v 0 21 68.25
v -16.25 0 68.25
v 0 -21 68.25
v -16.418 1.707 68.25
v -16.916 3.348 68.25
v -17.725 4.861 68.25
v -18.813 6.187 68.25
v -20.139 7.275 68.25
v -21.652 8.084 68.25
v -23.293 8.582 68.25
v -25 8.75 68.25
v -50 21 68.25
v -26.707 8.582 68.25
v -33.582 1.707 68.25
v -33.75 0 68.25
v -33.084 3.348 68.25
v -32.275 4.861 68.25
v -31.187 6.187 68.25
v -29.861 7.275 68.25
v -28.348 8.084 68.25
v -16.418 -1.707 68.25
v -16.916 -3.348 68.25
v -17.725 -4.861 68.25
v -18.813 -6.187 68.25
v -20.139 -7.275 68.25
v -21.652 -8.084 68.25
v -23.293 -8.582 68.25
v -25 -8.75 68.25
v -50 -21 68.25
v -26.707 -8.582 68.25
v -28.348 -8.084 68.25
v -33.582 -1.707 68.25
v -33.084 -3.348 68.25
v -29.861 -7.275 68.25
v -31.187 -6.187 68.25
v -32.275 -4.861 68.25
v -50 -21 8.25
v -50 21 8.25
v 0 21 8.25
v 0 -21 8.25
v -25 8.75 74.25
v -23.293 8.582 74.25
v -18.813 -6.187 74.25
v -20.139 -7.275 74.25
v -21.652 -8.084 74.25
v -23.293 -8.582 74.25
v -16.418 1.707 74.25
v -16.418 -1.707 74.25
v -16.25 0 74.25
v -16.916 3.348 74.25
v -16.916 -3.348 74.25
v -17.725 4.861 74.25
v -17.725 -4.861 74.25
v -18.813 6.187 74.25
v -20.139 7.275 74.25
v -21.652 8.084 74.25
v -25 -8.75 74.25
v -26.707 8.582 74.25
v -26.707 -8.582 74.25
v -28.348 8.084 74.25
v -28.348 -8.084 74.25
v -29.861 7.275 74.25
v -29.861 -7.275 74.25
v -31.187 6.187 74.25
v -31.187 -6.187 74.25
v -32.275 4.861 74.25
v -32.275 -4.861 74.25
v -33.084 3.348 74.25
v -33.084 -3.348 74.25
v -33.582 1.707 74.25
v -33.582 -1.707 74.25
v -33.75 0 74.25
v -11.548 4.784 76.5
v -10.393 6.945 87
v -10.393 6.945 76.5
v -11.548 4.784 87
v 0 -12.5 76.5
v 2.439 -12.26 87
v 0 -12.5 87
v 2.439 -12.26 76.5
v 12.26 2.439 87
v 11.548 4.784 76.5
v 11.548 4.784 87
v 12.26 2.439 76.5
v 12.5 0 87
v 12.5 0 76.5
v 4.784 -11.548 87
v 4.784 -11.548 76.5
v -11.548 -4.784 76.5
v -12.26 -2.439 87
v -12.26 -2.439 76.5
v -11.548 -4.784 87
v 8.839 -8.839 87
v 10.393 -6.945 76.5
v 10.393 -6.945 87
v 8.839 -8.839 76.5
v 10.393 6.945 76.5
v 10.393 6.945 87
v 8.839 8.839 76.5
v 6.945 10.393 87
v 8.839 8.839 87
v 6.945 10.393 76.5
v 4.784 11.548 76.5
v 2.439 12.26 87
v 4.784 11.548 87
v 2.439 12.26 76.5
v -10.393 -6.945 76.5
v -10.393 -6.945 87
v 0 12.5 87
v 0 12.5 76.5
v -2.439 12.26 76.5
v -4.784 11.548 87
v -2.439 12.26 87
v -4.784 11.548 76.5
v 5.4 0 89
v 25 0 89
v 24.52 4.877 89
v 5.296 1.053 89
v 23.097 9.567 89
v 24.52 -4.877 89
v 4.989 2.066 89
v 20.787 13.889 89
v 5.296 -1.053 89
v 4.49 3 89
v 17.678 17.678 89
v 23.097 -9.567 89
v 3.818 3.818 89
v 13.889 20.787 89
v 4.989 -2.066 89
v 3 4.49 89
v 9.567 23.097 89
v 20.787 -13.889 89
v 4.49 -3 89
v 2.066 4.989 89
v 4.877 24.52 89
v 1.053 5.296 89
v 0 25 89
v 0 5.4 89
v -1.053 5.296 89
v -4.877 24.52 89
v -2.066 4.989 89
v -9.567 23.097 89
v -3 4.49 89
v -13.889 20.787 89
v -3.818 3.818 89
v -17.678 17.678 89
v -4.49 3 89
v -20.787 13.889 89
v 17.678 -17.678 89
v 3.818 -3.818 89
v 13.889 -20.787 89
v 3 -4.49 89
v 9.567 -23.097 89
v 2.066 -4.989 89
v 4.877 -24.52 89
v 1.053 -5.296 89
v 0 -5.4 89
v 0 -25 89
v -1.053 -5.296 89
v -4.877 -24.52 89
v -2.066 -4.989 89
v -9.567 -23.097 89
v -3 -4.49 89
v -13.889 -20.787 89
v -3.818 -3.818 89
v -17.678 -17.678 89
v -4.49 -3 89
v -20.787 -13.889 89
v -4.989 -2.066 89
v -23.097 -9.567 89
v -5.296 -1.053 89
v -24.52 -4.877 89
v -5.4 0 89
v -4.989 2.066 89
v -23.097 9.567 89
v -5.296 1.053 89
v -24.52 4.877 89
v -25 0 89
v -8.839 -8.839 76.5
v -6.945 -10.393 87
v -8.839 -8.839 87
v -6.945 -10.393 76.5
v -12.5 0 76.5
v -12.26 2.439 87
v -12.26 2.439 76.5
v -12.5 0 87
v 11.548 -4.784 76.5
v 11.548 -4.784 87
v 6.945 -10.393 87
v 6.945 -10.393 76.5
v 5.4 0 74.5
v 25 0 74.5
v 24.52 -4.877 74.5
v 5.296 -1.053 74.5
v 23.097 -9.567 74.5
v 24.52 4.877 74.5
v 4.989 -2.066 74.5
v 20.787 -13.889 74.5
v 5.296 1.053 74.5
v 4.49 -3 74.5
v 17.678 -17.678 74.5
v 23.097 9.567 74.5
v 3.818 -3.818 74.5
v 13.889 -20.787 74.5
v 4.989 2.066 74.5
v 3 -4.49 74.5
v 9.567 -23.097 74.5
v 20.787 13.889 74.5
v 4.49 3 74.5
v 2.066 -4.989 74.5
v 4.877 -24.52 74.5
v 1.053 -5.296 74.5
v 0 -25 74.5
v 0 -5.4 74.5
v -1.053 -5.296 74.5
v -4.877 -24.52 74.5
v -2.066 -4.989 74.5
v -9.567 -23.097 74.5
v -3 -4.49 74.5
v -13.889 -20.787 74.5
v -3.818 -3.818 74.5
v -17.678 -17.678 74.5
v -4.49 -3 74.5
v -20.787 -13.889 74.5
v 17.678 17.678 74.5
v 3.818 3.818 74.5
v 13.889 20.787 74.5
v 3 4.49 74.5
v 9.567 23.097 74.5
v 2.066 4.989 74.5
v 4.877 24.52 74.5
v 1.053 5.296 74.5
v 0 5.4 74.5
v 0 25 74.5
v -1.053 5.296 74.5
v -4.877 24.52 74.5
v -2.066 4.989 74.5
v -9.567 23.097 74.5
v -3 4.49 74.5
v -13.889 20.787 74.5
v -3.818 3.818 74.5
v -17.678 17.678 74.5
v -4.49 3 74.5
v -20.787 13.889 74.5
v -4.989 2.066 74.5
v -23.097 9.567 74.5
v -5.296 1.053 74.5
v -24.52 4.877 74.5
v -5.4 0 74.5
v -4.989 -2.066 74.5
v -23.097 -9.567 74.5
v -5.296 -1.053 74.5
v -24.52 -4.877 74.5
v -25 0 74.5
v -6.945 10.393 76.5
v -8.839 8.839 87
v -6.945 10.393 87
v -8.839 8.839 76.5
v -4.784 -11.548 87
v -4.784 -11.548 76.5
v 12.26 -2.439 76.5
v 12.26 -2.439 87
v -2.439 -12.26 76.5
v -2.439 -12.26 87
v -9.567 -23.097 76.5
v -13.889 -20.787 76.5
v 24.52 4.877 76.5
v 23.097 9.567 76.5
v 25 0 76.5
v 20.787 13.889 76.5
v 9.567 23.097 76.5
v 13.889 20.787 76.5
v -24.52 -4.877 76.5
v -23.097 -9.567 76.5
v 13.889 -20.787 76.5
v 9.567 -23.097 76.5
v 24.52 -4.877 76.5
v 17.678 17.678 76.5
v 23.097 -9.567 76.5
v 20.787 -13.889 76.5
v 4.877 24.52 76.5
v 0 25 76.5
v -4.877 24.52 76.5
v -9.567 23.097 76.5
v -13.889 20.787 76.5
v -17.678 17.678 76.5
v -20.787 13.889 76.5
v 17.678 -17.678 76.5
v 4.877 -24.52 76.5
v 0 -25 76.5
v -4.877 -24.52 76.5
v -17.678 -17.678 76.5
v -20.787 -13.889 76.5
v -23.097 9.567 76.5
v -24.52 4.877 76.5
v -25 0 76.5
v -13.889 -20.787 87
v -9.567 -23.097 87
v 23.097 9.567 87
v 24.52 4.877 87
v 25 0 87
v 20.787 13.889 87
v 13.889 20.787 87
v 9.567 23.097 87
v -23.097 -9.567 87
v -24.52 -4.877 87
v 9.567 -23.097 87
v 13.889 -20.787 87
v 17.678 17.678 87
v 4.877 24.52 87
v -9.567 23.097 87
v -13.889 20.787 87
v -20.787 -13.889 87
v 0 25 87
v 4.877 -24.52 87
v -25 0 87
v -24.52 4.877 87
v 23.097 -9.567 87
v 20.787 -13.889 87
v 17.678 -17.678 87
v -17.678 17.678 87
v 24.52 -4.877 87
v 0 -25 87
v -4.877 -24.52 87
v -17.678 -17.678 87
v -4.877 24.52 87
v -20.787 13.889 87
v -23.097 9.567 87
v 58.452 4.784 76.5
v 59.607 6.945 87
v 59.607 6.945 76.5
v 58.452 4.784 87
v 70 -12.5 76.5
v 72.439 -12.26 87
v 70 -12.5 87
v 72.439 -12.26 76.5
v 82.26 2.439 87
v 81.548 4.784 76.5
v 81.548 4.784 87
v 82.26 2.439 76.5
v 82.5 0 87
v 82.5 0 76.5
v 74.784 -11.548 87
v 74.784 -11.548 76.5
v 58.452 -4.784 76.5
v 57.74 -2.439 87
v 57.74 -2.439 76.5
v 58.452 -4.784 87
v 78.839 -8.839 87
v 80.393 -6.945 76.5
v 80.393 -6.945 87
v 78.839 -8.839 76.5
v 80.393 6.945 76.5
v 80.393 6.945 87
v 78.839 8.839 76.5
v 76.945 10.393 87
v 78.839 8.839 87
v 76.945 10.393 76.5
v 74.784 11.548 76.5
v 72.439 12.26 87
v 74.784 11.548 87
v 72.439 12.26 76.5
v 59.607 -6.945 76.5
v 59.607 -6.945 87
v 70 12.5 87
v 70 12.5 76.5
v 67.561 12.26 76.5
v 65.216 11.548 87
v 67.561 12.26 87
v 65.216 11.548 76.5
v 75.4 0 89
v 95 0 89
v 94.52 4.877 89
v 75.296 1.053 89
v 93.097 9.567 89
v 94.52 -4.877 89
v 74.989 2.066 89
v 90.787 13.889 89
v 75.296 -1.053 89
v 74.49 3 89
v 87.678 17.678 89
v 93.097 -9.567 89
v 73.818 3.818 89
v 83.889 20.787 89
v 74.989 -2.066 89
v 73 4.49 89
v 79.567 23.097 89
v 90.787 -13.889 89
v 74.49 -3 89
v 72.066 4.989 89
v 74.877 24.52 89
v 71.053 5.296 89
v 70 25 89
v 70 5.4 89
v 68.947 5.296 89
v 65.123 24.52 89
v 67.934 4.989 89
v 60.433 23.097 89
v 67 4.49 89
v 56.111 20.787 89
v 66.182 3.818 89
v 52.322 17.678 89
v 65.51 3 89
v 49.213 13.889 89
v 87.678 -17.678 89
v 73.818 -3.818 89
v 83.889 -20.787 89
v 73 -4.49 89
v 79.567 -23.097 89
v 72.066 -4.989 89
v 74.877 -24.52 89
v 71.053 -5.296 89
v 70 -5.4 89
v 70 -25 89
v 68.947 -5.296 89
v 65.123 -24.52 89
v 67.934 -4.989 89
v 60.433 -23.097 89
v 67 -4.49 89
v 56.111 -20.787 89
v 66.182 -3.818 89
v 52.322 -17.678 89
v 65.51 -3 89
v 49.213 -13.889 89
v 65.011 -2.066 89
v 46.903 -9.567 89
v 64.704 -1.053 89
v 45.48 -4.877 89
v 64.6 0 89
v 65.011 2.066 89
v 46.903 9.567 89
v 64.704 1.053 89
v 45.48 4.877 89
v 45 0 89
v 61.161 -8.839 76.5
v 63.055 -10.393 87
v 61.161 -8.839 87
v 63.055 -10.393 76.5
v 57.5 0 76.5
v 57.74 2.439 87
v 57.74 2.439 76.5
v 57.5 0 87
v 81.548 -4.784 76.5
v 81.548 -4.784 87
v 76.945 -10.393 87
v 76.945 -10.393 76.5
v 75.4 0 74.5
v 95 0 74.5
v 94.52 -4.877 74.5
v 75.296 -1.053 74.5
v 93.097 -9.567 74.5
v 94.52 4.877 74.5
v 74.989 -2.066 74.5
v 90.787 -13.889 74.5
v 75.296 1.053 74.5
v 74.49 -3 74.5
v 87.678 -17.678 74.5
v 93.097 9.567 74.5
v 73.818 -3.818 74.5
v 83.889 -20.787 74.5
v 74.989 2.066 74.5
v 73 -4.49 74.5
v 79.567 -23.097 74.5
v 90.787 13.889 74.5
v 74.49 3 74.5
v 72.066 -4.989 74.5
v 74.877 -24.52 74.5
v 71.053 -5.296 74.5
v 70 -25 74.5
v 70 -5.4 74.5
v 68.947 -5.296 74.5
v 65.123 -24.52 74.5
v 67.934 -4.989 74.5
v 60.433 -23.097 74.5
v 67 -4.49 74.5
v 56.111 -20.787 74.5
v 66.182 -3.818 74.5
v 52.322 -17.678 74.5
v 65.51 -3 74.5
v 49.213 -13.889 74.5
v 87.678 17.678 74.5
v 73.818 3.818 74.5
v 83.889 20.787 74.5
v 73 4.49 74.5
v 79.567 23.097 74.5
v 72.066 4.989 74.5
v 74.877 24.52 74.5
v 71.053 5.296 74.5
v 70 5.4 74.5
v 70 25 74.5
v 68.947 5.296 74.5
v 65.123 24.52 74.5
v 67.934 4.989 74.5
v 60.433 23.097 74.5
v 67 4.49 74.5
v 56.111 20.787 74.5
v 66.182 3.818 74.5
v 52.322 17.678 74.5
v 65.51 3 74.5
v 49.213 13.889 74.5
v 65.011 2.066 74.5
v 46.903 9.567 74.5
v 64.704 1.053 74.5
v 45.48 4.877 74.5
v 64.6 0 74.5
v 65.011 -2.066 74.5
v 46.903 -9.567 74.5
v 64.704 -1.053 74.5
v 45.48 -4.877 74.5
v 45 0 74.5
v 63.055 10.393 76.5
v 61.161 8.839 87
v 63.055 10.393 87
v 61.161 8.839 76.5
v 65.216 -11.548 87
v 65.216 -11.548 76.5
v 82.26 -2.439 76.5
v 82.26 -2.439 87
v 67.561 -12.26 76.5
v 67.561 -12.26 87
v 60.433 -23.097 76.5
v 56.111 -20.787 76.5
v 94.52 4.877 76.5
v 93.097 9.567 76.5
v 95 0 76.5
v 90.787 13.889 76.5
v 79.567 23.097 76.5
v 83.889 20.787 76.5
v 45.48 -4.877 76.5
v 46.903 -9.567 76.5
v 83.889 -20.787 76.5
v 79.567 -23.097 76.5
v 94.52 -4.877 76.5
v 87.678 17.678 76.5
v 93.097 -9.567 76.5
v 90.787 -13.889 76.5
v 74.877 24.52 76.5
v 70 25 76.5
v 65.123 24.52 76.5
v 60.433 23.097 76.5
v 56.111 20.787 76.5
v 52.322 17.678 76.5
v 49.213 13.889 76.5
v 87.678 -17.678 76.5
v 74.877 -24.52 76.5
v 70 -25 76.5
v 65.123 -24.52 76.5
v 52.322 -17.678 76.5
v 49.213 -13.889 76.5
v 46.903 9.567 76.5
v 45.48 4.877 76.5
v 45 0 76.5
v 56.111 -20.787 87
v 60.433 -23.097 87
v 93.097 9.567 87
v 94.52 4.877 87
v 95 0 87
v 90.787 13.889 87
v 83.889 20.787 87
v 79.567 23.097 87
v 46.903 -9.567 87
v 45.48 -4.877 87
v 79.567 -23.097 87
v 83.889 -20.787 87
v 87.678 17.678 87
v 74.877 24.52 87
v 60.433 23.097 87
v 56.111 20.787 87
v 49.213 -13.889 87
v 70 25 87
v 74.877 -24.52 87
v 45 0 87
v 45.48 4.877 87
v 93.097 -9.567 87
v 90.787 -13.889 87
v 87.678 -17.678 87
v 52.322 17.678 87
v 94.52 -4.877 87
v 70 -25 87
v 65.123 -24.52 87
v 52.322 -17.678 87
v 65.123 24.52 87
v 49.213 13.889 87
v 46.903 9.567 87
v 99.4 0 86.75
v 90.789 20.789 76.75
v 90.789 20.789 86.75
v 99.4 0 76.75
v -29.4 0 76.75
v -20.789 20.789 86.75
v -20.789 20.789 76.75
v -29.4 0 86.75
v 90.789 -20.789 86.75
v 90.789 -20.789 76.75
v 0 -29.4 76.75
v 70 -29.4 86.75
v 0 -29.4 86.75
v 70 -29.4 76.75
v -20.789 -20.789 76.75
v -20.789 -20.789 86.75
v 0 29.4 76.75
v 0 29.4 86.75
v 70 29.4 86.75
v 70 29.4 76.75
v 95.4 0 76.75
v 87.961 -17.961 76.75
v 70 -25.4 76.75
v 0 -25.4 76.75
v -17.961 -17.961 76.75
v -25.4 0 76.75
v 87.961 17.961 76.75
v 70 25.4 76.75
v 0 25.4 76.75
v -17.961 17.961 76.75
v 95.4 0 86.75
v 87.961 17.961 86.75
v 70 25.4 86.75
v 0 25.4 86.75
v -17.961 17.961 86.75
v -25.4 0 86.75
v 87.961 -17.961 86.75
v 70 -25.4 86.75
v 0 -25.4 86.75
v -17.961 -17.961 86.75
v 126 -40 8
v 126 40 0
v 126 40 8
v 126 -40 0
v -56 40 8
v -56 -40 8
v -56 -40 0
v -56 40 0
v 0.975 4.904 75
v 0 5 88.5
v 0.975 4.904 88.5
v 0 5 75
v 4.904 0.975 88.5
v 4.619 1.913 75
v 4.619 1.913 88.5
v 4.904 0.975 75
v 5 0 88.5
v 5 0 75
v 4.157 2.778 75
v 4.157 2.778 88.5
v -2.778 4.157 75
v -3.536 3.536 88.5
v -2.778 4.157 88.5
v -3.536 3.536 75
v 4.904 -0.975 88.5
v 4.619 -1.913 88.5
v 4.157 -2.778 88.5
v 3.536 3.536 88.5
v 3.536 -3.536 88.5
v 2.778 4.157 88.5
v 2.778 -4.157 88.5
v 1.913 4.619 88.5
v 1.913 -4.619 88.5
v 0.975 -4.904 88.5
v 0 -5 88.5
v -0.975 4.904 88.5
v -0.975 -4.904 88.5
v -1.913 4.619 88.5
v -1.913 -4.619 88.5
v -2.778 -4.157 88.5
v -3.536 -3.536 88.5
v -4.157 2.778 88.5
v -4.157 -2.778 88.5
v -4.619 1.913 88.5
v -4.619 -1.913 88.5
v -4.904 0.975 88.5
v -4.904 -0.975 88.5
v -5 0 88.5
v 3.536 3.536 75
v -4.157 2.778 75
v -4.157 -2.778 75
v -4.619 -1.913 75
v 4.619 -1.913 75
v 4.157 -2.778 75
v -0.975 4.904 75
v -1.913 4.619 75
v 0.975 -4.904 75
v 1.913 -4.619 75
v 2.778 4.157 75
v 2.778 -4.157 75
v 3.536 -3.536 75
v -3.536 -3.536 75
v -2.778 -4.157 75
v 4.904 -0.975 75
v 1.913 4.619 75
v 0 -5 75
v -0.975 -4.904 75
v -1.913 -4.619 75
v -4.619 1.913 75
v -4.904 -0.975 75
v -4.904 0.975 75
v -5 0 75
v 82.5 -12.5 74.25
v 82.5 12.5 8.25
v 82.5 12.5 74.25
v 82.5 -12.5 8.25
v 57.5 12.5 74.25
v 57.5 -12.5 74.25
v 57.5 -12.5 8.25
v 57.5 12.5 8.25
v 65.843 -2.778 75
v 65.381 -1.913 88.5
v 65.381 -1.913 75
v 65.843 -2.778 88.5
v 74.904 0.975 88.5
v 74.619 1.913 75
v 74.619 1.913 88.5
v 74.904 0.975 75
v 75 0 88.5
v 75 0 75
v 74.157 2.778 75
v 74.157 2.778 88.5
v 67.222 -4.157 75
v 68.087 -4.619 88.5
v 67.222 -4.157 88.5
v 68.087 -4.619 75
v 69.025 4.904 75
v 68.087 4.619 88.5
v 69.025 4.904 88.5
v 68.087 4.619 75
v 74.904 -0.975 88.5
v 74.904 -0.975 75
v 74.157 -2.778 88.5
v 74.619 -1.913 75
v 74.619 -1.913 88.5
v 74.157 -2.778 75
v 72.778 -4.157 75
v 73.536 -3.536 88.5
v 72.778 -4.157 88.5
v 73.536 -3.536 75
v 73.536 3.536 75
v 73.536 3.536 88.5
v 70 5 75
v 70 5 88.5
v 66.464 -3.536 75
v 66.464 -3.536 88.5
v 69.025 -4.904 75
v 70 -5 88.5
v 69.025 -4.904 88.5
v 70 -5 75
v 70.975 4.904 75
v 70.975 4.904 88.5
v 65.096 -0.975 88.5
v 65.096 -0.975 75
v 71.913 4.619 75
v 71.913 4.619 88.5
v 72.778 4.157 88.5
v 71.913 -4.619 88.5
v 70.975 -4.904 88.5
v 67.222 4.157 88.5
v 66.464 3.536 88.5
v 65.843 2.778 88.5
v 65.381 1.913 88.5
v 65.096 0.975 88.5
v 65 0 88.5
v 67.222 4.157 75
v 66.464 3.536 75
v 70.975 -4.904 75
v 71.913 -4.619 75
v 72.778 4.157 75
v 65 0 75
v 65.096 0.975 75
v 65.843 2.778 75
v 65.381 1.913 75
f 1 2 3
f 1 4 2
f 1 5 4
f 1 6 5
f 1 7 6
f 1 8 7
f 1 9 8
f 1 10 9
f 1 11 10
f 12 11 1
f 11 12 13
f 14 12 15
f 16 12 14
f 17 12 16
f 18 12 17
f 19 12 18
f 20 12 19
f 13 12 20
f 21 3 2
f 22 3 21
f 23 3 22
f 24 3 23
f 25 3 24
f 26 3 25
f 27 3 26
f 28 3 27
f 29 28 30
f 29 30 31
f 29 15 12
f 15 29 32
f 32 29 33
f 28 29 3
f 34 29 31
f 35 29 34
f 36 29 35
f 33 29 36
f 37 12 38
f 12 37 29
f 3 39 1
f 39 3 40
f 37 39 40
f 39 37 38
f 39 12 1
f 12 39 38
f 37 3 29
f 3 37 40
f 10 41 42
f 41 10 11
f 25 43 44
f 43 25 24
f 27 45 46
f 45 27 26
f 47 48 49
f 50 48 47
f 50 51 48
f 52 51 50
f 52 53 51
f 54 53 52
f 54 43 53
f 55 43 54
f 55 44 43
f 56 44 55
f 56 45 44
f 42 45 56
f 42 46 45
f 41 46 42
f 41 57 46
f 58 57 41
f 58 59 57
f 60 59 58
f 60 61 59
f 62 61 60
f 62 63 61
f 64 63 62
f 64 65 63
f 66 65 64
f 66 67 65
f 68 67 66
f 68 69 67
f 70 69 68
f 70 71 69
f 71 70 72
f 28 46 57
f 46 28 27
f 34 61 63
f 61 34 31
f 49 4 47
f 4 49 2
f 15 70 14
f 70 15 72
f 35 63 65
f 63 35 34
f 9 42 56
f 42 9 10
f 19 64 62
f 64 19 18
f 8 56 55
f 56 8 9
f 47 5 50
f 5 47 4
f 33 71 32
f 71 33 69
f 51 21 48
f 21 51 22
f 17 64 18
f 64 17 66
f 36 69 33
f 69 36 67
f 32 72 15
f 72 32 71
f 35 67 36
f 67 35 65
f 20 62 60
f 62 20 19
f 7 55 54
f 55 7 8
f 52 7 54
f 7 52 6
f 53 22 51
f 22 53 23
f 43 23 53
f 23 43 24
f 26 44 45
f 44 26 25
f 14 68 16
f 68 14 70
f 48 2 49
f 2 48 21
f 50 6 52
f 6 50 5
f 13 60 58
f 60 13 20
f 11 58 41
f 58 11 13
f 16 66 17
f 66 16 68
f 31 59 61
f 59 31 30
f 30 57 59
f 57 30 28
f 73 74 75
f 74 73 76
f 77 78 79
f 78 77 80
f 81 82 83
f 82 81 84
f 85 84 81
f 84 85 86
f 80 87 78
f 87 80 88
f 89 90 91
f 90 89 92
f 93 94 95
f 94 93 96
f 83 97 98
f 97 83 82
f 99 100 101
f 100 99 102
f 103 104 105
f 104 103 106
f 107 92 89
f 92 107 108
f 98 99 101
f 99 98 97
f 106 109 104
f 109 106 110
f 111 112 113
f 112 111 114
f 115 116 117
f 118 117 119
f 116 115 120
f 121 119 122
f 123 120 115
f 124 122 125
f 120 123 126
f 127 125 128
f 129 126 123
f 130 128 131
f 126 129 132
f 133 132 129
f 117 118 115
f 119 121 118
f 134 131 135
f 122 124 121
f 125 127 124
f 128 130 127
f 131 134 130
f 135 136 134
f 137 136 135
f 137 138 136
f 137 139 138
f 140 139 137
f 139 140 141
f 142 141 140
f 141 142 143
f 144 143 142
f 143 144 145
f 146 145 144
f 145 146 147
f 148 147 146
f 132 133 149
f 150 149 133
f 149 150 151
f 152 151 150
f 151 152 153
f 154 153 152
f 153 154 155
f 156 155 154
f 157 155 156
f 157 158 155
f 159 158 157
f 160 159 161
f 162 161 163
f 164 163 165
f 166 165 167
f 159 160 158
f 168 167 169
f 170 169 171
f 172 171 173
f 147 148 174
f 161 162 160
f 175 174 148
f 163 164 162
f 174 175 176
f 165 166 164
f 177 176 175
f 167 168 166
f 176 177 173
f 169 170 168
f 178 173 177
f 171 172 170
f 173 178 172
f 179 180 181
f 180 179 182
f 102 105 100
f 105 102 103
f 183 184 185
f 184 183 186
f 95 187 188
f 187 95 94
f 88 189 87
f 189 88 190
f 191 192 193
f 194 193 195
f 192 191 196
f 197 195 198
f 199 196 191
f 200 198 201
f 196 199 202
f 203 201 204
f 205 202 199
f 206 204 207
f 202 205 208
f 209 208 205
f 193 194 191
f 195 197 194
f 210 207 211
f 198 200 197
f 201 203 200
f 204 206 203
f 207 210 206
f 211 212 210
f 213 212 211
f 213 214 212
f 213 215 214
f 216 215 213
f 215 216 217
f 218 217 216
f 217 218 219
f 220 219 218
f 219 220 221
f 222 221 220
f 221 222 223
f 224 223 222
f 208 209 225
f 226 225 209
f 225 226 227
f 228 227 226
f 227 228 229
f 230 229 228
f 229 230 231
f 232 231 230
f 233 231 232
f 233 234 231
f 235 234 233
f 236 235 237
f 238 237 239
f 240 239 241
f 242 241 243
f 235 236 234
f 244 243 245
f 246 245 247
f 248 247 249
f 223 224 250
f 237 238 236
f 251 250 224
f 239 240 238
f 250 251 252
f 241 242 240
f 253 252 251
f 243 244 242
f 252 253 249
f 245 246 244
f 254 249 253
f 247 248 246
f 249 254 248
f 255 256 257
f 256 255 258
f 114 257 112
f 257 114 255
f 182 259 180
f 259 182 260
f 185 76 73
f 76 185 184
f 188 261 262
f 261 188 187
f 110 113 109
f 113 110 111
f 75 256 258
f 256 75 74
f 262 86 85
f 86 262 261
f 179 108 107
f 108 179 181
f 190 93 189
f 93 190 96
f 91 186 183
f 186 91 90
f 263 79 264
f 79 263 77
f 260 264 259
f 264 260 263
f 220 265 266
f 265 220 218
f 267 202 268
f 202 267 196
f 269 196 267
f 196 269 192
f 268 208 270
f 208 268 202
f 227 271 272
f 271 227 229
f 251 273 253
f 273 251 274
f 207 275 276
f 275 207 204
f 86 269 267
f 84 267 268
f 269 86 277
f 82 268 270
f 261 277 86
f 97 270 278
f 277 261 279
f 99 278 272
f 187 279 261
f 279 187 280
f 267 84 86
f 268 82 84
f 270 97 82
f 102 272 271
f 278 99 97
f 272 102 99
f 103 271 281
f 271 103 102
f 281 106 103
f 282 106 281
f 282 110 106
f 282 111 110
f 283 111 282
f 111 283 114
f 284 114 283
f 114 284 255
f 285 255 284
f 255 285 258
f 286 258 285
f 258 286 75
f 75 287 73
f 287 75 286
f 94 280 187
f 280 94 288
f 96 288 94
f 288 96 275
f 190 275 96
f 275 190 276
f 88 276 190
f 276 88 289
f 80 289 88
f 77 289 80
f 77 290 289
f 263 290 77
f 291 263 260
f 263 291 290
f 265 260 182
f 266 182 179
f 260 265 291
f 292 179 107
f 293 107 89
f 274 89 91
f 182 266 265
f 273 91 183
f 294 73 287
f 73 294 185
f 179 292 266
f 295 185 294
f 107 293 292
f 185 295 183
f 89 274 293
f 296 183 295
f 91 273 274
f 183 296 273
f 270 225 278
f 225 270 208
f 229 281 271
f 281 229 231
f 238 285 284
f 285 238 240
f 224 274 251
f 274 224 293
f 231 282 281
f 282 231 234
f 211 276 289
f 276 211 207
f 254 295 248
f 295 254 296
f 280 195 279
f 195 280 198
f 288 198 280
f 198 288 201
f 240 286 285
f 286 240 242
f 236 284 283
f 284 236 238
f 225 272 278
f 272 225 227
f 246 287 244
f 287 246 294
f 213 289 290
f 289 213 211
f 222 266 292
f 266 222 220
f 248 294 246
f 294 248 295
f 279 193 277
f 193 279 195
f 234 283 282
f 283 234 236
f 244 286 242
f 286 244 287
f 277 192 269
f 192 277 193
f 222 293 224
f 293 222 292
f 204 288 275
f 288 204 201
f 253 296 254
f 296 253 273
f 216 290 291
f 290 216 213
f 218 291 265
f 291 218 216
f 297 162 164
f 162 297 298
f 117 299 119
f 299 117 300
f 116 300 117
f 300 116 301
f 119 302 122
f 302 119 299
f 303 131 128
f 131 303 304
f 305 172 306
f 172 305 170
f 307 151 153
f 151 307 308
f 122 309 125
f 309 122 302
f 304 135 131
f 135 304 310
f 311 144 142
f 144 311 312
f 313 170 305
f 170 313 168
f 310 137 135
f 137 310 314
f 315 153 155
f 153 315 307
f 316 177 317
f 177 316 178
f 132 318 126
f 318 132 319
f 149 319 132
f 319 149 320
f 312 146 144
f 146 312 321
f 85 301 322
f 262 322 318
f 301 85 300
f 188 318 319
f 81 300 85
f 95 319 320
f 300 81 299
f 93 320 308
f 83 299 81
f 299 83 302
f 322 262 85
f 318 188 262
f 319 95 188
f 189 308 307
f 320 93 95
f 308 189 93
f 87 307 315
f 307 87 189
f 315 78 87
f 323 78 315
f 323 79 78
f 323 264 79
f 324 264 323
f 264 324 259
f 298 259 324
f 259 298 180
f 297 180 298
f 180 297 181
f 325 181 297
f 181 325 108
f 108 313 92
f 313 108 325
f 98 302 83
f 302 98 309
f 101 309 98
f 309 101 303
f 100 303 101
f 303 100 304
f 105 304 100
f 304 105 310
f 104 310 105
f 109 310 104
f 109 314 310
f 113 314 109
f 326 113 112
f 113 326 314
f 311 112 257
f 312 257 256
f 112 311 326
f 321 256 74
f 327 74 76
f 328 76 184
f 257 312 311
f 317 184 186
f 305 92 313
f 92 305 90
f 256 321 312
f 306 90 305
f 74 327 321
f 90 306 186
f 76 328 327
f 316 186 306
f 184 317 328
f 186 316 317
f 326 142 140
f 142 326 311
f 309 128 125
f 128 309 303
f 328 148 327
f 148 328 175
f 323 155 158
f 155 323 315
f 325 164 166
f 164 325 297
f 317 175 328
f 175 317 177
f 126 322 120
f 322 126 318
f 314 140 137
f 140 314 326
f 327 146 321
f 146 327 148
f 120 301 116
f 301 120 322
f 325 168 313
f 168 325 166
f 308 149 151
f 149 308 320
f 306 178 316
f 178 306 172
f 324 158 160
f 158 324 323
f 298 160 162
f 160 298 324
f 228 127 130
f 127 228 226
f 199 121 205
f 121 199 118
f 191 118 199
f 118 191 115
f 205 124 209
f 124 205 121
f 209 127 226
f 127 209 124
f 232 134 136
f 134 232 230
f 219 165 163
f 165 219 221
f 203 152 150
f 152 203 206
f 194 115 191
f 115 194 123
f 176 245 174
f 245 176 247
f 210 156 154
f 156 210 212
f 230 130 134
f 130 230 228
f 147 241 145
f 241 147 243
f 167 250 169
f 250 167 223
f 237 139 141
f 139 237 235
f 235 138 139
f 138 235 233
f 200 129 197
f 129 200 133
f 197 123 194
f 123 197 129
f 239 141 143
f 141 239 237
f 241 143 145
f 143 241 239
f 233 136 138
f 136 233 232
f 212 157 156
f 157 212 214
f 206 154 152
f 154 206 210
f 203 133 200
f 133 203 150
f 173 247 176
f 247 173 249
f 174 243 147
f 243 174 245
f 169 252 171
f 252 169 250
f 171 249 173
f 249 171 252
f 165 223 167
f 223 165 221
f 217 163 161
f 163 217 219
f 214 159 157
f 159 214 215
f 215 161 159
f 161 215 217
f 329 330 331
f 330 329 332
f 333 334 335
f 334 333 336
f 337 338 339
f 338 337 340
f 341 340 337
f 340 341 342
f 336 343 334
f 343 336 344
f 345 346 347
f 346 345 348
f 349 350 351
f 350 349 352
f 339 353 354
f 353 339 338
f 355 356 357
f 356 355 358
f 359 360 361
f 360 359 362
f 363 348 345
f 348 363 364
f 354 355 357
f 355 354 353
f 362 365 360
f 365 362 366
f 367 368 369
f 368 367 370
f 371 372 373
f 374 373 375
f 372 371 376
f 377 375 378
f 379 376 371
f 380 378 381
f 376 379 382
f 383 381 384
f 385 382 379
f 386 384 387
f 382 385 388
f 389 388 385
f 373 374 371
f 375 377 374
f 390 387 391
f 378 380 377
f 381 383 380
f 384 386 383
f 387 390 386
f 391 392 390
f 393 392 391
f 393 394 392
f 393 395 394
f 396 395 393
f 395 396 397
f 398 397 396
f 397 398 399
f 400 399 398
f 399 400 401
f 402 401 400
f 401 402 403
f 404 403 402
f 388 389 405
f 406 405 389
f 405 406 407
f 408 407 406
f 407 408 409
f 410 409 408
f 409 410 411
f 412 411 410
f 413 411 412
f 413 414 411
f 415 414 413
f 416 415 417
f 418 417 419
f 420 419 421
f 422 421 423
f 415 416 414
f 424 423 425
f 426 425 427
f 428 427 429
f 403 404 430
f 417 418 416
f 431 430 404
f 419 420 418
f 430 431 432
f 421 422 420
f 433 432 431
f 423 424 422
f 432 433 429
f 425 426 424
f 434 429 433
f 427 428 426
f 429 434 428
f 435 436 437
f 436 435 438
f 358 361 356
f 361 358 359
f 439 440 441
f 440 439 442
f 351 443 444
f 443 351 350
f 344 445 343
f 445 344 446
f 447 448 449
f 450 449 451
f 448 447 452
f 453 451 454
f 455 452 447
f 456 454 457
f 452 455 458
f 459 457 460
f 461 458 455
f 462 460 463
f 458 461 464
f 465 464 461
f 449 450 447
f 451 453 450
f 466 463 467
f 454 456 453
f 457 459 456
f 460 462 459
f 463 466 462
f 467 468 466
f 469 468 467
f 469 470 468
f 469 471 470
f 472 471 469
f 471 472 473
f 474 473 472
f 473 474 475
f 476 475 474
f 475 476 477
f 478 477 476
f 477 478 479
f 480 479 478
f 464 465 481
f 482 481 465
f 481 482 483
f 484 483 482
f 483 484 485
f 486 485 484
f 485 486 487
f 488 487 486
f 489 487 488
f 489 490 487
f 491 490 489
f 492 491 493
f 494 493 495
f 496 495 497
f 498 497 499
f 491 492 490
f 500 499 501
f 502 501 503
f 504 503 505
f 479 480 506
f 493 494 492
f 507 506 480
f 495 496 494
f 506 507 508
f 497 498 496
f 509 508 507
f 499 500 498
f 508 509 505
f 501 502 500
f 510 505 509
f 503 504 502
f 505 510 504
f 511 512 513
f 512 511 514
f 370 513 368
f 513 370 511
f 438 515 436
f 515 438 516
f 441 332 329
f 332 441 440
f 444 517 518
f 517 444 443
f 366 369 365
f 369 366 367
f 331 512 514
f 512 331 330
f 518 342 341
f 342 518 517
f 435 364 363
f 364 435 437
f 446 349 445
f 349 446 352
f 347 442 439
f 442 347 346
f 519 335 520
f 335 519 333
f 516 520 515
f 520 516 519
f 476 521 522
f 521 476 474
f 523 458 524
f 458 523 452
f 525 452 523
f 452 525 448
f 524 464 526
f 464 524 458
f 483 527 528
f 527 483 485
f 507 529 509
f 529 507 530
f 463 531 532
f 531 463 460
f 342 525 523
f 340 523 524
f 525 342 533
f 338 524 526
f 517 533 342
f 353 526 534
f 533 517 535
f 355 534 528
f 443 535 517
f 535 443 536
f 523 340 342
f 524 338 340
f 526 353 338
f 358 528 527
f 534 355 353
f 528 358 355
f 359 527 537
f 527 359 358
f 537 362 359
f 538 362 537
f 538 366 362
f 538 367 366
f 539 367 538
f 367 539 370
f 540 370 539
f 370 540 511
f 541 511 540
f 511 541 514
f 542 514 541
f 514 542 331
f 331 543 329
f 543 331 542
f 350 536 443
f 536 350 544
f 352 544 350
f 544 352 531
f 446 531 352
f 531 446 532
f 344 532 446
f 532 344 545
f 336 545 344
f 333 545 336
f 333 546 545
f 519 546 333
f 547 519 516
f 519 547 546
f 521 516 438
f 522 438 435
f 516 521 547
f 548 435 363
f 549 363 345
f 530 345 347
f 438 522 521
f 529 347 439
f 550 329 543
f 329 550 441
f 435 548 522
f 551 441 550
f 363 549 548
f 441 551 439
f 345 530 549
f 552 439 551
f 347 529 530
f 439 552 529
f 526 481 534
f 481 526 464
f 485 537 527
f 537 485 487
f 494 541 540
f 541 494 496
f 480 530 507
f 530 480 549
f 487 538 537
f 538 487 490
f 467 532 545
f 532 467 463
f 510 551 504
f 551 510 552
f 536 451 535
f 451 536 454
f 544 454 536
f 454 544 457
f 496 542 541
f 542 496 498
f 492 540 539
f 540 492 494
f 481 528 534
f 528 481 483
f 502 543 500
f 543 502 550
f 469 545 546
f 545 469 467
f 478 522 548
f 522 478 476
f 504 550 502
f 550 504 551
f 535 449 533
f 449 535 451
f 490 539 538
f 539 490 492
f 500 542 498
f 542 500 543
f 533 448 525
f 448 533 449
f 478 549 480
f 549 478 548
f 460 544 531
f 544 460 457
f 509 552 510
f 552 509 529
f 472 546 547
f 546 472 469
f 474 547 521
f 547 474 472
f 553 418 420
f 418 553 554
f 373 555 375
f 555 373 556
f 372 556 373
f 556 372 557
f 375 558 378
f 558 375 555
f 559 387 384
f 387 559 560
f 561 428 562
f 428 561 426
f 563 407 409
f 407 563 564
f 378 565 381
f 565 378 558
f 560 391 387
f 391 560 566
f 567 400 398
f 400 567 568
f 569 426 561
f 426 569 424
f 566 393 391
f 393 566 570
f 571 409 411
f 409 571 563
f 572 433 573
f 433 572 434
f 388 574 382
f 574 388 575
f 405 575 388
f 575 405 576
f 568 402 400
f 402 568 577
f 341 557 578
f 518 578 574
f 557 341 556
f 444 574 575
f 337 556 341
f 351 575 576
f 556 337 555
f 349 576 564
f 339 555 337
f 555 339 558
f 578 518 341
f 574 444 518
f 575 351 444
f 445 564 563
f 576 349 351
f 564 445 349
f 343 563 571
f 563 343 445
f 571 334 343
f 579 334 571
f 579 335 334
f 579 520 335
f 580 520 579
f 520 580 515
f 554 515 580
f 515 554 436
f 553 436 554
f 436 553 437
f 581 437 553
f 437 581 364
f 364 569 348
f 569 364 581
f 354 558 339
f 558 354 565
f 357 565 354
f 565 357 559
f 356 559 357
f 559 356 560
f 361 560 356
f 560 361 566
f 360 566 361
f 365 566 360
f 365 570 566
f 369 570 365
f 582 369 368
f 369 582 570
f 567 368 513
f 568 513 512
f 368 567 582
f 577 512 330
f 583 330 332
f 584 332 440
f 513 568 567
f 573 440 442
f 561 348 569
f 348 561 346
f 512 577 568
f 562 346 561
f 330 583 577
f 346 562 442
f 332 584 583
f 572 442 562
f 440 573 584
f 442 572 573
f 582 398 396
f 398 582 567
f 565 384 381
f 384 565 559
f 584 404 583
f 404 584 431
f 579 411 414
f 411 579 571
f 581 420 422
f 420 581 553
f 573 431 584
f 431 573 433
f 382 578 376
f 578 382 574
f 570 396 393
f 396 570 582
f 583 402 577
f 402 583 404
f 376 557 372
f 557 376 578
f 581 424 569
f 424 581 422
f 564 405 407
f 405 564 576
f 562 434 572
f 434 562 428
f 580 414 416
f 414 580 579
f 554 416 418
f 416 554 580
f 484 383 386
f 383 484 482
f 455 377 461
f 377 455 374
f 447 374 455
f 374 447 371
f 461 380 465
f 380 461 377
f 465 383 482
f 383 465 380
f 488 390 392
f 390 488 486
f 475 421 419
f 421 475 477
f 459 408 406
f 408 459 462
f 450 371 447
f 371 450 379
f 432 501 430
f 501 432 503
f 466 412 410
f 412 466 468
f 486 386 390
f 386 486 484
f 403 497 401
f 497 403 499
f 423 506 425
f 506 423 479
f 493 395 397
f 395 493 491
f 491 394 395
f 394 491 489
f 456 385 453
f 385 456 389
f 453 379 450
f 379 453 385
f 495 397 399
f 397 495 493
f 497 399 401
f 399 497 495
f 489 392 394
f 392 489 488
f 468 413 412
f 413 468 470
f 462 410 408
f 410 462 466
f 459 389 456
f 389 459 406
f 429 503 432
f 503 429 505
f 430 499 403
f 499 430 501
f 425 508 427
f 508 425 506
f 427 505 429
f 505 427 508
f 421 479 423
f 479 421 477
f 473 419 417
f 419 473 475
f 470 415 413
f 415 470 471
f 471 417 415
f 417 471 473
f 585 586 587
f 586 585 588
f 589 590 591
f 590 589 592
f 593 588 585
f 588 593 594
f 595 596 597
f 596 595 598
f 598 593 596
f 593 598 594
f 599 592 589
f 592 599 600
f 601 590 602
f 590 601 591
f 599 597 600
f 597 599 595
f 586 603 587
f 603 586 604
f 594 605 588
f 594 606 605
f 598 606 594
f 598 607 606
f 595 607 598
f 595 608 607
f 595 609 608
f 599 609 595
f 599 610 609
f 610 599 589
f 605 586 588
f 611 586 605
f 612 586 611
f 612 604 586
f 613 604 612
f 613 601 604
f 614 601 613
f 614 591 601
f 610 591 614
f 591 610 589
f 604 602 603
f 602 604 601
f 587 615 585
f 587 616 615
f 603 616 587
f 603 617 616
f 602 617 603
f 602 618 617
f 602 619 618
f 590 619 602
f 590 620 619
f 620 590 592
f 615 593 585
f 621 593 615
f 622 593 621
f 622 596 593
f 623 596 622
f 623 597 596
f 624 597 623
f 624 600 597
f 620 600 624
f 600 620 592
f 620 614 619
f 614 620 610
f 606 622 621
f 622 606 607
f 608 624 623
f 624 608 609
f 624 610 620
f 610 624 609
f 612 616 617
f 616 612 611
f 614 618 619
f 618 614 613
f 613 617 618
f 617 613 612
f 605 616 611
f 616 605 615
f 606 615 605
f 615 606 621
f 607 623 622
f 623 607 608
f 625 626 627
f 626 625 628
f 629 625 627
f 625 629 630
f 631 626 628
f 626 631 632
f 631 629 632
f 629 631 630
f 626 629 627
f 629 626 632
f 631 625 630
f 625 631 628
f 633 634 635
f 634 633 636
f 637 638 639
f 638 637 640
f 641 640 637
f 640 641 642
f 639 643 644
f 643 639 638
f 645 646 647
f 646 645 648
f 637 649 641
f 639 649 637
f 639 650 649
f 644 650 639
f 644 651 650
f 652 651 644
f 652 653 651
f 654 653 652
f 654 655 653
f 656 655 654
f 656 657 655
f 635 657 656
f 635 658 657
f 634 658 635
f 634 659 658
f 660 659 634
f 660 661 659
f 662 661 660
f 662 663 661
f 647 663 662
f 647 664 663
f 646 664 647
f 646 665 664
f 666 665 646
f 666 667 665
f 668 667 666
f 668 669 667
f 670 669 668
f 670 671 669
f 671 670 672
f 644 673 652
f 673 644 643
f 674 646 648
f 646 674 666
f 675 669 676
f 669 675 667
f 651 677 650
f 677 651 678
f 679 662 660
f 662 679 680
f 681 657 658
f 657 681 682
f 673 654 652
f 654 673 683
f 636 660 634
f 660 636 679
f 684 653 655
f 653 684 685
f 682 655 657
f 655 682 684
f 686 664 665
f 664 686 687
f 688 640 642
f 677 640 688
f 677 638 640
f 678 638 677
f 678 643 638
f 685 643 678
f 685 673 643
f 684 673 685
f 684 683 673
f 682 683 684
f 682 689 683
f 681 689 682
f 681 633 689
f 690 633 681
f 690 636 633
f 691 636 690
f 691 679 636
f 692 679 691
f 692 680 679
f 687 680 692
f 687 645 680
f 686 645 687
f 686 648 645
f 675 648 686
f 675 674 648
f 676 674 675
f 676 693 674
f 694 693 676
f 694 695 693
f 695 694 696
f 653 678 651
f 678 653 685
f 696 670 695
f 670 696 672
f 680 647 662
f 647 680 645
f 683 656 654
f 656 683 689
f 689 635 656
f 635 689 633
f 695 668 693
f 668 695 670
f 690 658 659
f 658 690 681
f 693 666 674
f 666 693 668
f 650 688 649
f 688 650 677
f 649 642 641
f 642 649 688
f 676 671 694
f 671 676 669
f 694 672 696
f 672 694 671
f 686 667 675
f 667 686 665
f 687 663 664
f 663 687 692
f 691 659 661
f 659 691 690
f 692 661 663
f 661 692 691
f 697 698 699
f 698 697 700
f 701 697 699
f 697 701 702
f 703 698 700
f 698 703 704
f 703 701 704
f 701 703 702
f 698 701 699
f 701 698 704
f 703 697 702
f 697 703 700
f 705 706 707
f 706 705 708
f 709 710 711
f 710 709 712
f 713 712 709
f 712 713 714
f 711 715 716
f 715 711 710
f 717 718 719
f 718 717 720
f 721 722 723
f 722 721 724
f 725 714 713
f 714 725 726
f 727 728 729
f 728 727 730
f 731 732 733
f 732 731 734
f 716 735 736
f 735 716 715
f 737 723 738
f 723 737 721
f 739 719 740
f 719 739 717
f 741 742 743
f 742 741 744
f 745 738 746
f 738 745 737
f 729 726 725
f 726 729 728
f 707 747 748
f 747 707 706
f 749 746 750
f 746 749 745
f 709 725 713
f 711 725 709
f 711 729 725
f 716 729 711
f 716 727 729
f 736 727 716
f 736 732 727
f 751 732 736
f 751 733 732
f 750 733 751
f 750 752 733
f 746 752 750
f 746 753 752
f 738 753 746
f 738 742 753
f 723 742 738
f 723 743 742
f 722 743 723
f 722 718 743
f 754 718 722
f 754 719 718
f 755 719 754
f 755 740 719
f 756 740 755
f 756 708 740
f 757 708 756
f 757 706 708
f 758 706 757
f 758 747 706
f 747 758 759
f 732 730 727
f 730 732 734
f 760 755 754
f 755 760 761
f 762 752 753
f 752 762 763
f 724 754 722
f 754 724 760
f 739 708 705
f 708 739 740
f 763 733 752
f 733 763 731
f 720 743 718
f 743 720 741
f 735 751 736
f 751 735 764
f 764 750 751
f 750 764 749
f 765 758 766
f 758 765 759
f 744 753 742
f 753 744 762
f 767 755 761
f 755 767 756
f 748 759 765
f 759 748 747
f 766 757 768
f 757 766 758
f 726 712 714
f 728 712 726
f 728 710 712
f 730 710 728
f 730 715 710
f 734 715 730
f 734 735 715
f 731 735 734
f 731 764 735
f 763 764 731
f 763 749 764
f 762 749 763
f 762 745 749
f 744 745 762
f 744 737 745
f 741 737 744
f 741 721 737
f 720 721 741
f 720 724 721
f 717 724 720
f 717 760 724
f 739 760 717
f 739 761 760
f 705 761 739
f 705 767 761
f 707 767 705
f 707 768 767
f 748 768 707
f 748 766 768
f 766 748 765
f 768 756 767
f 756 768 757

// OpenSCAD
$fn = 32;

// ------------------------------------------------------------------------
// Motor belt drive: span 70 mm, pulleys d50, belt 10 mm wide
// Every part is its own module, assembly() places every instance.
// ------------------------------------------------------------------------

// --- part 1 ---
module base_plate() {
  difference() {
    translate([-91, -40, 0]) cube([182, 80, 8]);
  }
}

// --- part 2 ---
module motor() {
  union() {
    translate([-30, -21, 0]) cube([60, 42, 50]);
    translate([33, 0, 25]) rotate([0, 90, 0]) cylinder(h = 6, d = 17.5, center = true);
  }
}

// --- part 3 ---
module drive_shaft() {
  translate([0, 0, -6.75]) cylinder(h = 13.5, d = 10);
}

// --- part 4 ---
module pulley_drive() {
  difference() {
    union() {
      cylinder(h = 14.5, d = 25);
      cylinder(h = 2, d = 50);
      translate([0, 0, 12.5]) cylinder(h = 2, d = 50);
    }
    translate([0, 0, -1]) cylinder(h = 16.5, d = 10.8);
  }
}

// --- part 5 ---
module idler_post() {
  translate([-12.5, -12.5, 0]) cube([25, 25, 66]);
}

// --- part 6 ---
module driven_shaft() {
  translate([0, 0, -6.75]) cylinder(h = 13.5, d = 10);
}

// --- part 7 ---
module pulley_driven() {
  difference() {
    union() {
      cylinder(h = 14.5, d = 25);
      cylinder(h = 2, d = 50);
      translate([0, 0, 12.5]) cylinder(h = 2, d = 50);
    }
    translate([0, 0, -1]) cylinder(h = 16.5, d = 10.8);
  }
}

// --- part 8 ---
module drive_belt() {
  difference() {
    linear_extrude(height = 10) polygon(points = concat([for (a = [90 : 45 : 270]) [29.4 * cos(a), 29.4 * sin(a)]], [for (a = [270 : 45 : 450]) [70 + 29.4 * cos(a), 29.4 * sin(a)]]));
    translate([0, 0, -1]) linear_extrude(height = 12) polygon(points = concat([for (a = [90 : 45 : 270]) [25.4 * cos(a), 25.4 * sin(a)]], [for (a = [270 : 45 : 450]) [70 + 25.4 * cos(a), 25.4 * sin(a)]]));
  }
}

// --- assembly ---
module assembly() {
  color([0.80, 0.24, 0.20]) translate([35, 0, 0]) rotate([0, 0, 0]) base_plate();
  color([0.20, 0.45, 0.75]) translate([0, 0, 38.25]) rotate([0, 270, 0]) motor();
  color([0.25, 0.62, 0.32]) translate([0, 0, 81.75]) rotate([0, 0, 0]) drive_shaft();
  color([0.92, 0.70, 0.18]) translate([0, 0, 74.5]) rotate([0, 0, 0]) pulley_drive();
  color([0.58, 0.35, 0.70]) translate([70, 0, 8.25]) rotate([0, 0, 0]) idler_post();
  color([0.16, 0.66, 0.66]) translate([70, 0, 81.75]) rotate([0, 0, 0]) driven_shaft();
  color([0.85, 0.48, 0.18]) translate([70, 0, 74.5]) rotate([0, 0, 0]) pulley_driven();
  color([0.55, 0.60, 0.65]) translate([0, 0, 76.75]) rotate([0, 0, 0]) drive_belt();
}

assembly();
